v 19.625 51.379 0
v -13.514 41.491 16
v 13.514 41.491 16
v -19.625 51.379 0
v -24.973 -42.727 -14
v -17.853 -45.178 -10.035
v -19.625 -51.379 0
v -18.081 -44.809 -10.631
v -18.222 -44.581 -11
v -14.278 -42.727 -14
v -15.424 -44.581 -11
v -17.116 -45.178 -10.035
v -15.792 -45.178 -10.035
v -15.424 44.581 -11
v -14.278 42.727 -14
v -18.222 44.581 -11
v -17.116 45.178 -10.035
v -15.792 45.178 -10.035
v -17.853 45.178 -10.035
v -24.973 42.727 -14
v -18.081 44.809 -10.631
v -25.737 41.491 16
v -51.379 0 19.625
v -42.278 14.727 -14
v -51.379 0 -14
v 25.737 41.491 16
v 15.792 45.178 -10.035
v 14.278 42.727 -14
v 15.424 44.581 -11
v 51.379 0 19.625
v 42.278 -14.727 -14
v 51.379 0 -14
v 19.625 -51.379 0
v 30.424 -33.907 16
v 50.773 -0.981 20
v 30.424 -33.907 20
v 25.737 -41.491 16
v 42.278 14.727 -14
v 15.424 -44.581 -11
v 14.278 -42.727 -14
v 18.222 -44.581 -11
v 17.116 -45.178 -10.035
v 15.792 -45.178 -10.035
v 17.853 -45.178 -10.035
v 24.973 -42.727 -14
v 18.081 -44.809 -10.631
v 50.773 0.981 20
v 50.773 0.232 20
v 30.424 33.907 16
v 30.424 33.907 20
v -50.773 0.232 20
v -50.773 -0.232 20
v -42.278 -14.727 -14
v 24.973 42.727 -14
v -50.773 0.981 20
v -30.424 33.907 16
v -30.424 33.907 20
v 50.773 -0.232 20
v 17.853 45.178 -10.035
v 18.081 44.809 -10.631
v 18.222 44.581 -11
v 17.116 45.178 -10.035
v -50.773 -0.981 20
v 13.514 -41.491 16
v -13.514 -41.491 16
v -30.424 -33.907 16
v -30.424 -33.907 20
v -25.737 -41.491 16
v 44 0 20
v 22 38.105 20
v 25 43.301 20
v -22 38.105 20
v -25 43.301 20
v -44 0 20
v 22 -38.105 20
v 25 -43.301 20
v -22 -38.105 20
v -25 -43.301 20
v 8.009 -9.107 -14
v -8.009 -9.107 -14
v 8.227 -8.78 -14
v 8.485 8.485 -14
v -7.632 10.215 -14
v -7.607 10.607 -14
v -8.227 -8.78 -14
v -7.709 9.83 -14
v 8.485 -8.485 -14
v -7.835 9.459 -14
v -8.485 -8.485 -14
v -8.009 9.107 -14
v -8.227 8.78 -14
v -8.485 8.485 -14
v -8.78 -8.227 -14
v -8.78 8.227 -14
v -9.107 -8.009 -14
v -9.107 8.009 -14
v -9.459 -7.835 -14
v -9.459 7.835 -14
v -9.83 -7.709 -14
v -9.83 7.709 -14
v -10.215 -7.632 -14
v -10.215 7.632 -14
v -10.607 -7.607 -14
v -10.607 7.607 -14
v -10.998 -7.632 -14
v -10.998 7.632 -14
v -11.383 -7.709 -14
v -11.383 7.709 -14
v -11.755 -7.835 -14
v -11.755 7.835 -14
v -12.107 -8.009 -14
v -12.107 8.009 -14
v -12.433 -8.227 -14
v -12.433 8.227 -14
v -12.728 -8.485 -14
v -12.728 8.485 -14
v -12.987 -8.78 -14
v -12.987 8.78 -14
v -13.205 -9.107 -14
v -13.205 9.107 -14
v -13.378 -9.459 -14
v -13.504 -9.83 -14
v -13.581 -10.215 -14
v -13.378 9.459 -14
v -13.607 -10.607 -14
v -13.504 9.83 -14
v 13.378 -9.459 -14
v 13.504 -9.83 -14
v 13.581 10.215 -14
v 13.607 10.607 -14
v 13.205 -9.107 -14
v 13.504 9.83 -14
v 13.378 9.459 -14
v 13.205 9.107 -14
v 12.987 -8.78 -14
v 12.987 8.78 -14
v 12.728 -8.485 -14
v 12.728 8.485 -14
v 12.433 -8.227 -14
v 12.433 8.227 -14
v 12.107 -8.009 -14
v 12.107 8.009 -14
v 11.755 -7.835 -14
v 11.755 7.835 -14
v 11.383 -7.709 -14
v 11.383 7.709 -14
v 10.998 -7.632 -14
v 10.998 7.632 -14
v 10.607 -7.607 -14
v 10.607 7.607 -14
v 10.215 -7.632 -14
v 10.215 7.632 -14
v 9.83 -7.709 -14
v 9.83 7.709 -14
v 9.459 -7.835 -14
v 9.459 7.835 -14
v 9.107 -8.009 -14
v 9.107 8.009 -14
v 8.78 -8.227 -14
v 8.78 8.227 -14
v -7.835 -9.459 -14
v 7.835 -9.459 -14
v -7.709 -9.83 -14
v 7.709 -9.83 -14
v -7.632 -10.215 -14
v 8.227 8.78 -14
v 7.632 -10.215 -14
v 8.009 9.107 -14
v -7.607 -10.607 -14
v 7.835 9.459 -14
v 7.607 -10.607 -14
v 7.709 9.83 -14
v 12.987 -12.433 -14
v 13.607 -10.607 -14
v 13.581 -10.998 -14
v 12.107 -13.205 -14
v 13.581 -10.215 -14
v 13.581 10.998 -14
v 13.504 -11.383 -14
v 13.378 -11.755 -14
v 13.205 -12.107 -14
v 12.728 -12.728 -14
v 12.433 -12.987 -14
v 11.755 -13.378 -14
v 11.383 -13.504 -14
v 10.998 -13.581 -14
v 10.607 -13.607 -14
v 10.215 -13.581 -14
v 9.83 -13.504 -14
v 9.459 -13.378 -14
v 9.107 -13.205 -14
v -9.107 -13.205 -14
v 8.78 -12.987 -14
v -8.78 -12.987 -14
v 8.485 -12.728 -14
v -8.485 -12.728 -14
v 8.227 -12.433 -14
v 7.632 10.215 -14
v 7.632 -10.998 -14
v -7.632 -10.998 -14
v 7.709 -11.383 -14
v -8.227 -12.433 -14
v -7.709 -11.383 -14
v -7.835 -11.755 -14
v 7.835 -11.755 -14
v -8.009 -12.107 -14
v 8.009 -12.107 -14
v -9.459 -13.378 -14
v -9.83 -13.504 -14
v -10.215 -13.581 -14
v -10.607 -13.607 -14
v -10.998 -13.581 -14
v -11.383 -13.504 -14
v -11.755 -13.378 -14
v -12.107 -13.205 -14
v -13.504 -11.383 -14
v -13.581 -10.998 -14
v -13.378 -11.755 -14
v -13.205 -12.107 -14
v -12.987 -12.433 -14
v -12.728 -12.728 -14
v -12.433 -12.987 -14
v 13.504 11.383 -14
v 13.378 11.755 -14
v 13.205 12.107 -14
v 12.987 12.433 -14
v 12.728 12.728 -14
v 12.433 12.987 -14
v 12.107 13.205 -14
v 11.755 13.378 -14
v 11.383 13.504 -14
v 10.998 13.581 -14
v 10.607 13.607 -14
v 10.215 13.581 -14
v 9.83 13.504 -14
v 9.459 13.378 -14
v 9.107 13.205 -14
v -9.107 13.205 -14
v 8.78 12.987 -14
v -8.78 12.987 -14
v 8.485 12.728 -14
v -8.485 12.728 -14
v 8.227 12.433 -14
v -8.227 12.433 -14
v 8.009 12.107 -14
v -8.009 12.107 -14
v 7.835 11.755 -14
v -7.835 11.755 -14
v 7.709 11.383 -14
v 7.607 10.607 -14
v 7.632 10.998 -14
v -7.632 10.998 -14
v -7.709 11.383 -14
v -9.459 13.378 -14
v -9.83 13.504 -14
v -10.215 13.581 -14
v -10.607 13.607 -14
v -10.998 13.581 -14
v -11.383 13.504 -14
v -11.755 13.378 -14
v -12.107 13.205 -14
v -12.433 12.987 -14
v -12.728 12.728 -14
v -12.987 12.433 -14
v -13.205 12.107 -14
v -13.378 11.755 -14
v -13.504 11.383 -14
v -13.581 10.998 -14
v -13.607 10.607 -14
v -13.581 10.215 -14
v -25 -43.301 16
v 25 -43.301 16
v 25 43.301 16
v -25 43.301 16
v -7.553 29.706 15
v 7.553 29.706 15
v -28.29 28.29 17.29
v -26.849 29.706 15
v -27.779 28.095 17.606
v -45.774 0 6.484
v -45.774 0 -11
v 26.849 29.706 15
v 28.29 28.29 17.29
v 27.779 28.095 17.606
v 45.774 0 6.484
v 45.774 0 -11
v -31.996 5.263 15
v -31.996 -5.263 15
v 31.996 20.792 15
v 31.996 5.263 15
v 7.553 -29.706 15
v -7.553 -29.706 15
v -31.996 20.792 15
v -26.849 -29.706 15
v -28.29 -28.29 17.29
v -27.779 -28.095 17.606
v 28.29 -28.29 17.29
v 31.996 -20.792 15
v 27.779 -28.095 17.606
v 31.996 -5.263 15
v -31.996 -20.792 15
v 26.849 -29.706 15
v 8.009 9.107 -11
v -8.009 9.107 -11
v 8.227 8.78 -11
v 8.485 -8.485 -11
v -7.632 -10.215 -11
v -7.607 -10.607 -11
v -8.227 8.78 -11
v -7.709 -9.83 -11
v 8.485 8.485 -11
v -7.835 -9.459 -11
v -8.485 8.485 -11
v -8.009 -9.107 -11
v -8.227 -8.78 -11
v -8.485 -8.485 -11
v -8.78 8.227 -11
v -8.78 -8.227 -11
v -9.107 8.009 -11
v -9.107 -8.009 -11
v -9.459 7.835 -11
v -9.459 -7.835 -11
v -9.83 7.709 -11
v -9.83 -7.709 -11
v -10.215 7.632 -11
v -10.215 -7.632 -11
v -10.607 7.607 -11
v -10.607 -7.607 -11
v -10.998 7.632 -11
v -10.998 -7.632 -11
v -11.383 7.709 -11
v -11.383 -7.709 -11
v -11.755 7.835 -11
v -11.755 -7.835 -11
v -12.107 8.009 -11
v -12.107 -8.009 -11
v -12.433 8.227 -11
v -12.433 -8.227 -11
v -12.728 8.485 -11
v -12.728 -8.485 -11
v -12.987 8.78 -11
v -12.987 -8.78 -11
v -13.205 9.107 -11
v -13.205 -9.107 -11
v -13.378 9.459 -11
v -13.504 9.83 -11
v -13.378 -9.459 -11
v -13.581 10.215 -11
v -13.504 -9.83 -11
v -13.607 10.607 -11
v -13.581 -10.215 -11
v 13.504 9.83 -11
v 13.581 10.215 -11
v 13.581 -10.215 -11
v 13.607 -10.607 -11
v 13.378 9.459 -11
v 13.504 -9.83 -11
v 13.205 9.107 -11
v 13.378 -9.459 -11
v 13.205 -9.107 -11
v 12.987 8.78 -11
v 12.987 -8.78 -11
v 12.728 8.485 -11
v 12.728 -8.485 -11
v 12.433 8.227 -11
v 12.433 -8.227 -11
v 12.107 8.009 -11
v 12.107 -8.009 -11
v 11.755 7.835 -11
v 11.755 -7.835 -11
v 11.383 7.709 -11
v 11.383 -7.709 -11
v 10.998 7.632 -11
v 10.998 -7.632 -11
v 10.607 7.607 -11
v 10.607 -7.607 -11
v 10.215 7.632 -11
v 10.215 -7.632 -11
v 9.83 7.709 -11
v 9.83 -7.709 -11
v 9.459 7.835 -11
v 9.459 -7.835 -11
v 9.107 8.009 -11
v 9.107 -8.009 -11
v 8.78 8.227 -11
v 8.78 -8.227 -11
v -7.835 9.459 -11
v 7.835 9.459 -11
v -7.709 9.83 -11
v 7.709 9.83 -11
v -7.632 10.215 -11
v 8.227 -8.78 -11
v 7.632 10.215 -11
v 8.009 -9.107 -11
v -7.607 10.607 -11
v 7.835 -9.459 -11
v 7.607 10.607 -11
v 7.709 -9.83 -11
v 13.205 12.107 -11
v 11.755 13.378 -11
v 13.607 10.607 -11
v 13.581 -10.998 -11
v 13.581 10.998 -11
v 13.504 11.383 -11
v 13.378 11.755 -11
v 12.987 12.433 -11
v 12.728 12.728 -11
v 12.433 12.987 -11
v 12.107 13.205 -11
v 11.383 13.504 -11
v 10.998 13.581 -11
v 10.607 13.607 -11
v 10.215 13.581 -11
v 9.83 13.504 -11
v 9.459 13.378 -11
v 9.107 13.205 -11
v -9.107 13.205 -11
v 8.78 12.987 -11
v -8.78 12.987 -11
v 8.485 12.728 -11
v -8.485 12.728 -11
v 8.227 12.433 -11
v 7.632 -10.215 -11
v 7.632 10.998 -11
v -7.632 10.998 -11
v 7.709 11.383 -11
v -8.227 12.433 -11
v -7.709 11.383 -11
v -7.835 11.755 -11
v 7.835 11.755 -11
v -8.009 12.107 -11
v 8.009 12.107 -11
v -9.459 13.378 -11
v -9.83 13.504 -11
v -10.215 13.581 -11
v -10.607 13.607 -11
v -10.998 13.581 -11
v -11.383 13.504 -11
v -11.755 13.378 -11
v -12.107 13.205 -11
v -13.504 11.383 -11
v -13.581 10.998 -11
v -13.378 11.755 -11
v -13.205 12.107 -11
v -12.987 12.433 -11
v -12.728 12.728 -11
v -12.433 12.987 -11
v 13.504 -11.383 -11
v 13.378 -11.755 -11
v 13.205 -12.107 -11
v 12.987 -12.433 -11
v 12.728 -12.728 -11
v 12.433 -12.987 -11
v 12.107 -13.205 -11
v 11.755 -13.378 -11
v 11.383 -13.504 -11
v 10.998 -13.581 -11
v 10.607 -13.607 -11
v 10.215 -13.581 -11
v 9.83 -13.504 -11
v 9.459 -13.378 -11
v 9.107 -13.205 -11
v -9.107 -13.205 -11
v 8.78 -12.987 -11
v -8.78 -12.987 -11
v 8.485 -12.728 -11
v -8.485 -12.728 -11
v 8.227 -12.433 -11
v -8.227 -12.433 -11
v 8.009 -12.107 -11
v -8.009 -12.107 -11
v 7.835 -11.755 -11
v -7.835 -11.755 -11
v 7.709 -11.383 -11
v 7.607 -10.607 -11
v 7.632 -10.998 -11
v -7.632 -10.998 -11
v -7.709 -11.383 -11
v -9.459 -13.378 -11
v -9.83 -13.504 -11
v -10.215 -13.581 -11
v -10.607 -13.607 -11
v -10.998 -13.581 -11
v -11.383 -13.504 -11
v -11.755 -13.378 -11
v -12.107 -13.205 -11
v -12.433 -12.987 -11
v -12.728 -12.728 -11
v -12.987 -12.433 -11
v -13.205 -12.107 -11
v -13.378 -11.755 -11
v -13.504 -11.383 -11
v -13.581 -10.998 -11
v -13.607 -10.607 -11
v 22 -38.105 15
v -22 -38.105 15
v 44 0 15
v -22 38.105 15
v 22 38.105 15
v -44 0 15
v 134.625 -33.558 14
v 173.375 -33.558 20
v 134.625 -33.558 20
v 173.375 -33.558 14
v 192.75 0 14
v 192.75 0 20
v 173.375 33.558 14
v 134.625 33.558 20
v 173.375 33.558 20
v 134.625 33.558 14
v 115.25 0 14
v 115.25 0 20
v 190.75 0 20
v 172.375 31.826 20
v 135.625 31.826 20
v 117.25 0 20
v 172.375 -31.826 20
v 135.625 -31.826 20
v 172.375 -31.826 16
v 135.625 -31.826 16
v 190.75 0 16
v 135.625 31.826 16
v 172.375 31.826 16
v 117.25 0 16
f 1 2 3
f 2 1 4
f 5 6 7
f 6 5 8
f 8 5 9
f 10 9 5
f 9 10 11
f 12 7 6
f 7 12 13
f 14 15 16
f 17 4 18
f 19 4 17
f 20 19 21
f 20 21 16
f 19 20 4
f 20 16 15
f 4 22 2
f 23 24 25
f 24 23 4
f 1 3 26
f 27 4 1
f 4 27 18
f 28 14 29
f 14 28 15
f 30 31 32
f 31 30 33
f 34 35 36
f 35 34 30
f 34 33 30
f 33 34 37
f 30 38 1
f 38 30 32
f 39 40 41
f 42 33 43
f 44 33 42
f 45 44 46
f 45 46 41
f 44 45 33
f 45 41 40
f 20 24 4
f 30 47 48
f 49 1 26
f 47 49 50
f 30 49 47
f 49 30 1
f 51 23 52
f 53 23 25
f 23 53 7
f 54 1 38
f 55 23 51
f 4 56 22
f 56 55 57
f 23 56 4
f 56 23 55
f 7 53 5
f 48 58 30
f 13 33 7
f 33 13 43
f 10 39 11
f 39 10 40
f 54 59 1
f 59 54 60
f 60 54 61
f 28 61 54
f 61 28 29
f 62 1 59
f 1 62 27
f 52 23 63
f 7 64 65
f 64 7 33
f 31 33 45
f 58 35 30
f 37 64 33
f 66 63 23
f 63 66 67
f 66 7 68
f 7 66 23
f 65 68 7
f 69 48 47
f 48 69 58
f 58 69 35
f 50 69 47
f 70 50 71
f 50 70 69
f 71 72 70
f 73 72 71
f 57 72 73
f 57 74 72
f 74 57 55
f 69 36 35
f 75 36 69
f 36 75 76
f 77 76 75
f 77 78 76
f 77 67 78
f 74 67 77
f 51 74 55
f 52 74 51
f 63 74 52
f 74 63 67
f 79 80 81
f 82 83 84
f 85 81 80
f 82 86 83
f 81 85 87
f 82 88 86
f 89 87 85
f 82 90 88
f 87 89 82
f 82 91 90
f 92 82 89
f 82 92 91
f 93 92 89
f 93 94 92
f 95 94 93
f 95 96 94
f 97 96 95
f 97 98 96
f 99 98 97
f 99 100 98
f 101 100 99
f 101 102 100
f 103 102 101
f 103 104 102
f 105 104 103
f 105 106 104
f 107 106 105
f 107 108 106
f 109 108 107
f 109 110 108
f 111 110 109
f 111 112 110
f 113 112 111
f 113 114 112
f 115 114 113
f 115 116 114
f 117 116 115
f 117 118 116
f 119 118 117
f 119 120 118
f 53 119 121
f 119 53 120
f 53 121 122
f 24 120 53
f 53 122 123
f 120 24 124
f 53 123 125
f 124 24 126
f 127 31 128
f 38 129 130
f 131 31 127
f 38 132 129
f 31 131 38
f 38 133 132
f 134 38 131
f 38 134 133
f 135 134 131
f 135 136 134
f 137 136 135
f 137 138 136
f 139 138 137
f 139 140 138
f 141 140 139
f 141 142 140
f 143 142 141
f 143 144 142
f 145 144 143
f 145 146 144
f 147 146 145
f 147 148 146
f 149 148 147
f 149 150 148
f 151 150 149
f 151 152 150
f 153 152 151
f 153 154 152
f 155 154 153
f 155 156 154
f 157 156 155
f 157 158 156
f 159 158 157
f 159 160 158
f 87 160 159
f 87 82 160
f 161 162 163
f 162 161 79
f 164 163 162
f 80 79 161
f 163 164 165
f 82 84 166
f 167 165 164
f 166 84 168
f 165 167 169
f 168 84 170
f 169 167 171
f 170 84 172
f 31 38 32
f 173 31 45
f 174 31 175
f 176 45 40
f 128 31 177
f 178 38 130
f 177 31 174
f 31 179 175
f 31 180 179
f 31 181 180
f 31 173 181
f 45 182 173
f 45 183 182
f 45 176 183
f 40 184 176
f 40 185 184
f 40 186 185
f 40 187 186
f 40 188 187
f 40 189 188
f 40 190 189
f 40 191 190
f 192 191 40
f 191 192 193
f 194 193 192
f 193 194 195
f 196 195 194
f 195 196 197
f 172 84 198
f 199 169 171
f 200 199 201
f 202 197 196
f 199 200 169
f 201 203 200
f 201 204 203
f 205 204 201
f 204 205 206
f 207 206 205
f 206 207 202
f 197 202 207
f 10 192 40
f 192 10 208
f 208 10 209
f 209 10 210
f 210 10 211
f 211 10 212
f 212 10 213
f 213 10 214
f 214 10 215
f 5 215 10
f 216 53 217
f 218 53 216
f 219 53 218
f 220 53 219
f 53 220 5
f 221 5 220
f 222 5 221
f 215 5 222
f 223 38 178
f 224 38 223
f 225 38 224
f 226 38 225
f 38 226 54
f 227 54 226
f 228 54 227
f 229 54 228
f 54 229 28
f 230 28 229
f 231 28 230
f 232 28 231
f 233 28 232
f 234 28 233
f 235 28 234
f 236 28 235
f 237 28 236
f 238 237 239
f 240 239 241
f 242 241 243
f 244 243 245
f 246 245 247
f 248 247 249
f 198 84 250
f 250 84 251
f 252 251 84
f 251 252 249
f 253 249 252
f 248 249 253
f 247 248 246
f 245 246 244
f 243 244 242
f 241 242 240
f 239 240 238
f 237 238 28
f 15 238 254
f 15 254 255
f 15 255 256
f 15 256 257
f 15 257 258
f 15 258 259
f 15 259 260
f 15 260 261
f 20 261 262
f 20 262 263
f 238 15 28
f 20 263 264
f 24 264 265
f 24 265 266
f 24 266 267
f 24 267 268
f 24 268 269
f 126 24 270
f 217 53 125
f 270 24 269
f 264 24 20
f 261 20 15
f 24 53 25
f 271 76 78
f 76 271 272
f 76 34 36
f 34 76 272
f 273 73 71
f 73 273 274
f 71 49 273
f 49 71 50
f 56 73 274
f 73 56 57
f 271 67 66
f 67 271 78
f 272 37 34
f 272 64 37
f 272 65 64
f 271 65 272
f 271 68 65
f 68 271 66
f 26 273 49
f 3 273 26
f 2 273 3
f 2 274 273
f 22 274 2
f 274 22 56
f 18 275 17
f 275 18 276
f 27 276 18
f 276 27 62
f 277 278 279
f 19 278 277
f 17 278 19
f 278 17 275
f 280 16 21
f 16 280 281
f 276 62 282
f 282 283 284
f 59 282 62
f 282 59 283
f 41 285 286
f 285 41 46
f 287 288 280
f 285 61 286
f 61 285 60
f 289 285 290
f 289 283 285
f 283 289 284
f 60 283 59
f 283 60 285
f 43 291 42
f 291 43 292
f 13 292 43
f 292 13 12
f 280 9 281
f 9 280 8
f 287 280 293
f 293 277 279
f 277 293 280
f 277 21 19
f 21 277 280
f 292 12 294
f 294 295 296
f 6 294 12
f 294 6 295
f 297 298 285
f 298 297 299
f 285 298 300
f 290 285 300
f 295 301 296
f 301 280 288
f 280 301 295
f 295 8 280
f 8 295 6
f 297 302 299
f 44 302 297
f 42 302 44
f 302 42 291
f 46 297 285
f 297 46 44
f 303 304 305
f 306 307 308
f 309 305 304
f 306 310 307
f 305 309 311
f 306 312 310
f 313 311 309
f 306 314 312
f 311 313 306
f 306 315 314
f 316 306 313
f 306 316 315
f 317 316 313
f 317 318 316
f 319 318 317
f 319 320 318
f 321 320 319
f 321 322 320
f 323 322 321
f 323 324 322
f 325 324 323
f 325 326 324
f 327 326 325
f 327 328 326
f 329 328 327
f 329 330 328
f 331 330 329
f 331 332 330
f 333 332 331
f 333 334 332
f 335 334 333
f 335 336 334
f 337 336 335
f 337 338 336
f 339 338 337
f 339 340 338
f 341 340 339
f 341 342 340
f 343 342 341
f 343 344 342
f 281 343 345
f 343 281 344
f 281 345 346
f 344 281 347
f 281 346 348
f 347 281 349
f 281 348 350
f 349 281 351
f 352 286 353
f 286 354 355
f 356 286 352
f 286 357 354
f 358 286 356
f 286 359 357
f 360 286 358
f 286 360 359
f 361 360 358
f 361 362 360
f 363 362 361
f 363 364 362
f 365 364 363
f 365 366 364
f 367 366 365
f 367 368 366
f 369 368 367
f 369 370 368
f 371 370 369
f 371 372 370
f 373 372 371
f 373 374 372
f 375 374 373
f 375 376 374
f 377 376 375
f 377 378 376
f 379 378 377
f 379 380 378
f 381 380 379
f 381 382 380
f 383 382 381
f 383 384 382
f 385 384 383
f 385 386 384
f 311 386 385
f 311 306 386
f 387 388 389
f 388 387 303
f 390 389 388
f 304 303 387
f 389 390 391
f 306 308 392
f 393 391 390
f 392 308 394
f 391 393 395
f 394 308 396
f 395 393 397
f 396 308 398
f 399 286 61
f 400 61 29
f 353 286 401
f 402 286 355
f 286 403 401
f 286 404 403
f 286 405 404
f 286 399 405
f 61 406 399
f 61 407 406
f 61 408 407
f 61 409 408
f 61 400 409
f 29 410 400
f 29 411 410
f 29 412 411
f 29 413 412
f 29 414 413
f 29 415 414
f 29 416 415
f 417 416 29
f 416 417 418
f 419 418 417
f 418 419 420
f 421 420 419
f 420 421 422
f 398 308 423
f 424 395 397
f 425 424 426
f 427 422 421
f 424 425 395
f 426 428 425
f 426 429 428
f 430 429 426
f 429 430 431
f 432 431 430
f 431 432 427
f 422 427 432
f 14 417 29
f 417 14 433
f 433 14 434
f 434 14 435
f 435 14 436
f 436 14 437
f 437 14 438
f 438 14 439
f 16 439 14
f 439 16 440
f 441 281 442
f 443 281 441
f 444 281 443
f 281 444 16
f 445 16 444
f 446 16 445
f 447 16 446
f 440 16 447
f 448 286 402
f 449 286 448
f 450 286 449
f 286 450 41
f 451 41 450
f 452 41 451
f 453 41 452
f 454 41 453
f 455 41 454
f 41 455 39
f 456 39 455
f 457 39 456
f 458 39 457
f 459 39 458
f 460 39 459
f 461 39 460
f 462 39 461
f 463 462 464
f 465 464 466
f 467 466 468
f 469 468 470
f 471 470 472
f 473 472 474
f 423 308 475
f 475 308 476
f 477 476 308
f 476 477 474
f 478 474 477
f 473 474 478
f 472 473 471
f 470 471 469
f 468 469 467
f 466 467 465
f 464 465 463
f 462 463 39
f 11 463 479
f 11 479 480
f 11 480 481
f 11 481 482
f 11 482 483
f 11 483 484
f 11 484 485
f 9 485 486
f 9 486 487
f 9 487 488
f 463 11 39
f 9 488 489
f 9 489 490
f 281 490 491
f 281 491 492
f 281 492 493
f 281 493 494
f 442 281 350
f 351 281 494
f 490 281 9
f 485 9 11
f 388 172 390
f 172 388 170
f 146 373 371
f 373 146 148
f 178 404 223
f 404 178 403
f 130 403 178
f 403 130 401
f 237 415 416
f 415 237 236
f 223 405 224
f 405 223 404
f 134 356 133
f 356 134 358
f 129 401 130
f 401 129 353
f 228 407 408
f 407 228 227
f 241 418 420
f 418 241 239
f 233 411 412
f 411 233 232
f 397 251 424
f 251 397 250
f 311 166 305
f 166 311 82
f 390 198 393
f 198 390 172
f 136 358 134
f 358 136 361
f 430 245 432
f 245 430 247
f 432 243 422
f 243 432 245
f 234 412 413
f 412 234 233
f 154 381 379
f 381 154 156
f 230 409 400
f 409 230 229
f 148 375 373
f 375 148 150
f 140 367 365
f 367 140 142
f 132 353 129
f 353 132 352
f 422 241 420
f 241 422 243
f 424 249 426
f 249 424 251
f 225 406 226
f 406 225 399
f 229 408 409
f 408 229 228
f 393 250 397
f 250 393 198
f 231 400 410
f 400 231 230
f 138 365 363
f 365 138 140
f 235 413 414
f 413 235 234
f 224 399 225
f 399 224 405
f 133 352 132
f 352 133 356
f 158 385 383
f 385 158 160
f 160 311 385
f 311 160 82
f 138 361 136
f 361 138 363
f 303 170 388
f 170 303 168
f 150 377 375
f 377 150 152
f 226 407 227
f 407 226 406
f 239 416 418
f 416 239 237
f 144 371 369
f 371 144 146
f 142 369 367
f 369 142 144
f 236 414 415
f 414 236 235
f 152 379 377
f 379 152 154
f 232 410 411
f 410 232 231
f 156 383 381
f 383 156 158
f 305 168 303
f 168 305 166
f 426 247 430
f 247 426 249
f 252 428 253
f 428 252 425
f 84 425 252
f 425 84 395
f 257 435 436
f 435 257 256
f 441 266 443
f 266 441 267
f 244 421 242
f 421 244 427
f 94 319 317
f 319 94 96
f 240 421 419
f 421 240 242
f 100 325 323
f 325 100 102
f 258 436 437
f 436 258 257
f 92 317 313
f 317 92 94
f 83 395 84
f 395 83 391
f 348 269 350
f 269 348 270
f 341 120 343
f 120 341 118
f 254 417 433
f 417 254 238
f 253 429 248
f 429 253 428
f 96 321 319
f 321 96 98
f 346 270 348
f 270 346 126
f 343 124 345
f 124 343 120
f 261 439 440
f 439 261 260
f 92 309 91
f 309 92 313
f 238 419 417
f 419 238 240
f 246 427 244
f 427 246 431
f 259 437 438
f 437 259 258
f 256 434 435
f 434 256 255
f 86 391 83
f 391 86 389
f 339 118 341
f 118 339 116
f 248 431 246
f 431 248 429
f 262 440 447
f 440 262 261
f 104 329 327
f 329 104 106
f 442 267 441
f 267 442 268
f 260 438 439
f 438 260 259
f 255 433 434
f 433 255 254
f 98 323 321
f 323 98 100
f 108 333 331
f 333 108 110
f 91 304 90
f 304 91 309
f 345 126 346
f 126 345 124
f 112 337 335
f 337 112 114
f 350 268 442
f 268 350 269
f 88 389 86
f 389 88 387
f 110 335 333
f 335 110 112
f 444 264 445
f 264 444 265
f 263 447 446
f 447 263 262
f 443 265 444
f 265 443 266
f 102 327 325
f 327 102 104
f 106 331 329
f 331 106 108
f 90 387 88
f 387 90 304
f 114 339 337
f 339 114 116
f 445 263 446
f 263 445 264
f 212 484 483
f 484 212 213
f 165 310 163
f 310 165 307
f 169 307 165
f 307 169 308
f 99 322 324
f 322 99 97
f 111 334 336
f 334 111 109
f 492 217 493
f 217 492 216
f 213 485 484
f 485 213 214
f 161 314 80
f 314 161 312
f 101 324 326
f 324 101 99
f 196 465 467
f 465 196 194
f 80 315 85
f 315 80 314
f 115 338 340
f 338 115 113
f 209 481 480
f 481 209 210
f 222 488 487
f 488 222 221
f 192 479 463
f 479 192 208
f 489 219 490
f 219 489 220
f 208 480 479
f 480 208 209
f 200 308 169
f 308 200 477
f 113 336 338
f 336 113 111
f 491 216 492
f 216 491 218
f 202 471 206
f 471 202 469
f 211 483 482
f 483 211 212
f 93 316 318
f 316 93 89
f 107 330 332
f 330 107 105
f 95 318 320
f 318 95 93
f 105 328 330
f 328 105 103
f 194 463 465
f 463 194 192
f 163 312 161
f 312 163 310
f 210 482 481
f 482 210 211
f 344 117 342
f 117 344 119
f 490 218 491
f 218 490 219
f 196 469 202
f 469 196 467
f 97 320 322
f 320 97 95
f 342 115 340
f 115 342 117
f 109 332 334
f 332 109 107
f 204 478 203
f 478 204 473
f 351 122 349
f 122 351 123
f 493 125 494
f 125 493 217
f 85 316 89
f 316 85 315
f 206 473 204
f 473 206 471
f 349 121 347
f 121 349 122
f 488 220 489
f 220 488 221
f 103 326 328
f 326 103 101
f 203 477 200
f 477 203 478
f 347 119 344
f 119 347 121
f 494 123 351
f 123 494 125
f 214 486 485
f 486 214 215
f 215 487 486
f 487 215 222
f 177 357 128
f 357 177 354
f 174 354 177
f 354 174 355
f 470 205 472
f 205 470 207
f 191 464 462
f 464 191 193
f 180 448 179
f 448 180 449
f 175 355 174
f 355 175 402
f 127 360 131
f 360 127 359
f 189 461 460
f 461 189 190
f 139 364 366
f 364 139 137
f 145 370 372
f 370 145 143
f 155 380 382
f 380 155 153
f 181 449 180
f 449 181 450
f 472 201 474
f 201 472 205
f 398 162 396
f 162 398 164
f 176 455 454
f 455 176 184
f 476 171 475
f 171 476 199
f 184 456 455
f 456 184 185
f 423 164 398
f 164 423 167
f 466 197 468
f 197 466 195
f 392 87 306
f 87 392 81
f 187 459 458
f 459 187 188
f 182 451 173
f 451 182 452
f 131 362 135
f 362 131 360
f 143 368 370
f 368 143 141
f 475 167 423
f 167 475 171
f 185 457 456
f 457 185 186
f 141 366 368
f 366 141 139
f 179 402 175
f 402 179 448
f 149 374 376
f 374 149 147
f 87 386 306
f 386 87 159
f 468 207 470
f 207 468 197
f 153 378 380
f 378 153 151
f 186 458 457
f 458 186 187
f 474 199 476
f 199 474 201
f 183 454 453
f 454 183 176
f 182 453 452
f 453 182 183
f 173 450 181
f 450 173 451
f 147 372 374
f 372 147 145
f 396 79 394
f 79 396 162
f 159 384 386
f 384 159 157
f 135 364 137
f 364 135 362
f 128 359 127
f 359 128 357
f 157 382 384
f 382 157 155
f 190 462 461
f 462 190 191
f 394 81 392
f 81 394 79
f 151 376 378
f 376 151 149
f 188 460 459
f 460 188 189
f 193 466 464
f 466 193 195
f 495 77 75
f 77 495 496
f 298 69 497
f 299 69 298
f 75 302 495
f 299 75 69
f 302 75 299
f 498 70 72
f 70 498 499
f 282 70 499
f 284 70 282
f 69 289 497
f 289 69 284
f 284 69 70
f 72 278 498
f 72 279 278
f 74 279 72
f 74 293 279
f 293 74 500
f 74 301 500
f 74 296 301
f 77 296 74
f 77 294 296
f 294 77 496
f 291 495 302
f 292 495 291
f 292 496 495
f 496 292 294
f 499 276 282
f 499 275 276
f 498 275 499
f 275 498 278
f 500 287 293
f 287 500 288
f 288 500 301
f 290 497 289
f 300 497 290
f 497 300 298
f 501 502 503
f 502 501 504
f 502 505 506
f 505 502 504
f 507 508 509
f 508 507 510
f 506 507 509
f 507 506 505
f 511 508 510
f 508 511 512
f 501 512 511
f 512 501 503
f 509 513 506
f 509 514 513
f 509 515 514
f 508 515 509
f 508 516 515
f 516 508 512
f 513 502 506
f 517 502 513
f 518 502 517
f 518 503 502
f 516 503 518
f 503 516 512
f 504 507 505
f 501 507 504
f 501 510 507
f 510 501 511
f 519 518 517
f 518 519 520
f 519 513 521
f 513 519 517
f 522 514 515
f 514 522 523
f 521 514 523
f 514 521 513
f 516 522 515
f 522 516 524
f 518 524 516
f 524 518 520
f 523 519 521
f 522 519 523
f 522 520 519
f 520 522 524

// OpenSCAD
// Viral Geometric Desk Planter
// Dodecahedron shape with faceted surfaces
// unit: mm

// --- Parameters ---
body_radius = 55;
wall_thickness = 3;
rim_width = 50;       // rim outer radius = 50mm -> diameter ~100mm
rim_height = 4;
top_cut = 20;         // Z height to cut top
bottom_cut = 14;      // Z height below center to cut bottom
drain_hole_r = 3;
drain_hole_count = 4;
drain_hole_spread = 15;
tray_height = 6;
tray_wall = 2;
tray_clearance = 1;
chamfer_height = 5;
$fn = 48;

// --- Robust Dodecahedron ---
// Built by hulling pairs of opposite pentagons

module pentagon(r) {
    polygon([for (i = [0:4]) [r * cos(72*i + 90), r * sin(72*i + 90)]]);
}

module dodecahedron(r) {
    phi = (1 + sqrt(5)) / 2;
    // Scale factor so circumradius = r
    s = r / sqrt(3);
    // Use minkowski-free approach: scaled icosidodecahedron approximation
    // Actually use hull of 20 vertices
    c = s;
    p = s * phi;
    ip = s / phi;
    pts = [
        [ c,  c,  c], [ c,  c, -c], [ c, -c,  c], [ c, -c, -c],
        [-c,  c,  c], [-c,  c, -c], [-c, -c,  c], [-c, -c, -c],
        [0,  ip,  p], [0,  ip, -p], [0, -ip,  p], [0, -ip, -p],
        [ ip,  p, 0], [ ip, -p, 0], [-ip,  p, 0], [-ip, -p, 0],
        [ p, 0,  ip], [ p, 0, -ip], [-p, 0,  ip], [-p, 0, -ip]
    ];
    hull() {
        for (pt = pts) {
            translate(pt) sphere(r = 0.01, $fn = 6);
        }
    }
}

// Faceted dodecahedron using intersection of 12 half-spaces
module faceted_dodecahedron(r) {
    phi = (1 + sqrt(5)) / 2;
    // 12 face normals of dodecahedron (directions of icosahedron vertices)
    dirs = [
        [0,  1,  phi], [0,  1, -phi], [0, -1,  phi], [0, -1, -phi],
        [ 1,  phi, 0], [ 1, -phi, 0], [-1,  phi, 0], [-1, -phi, 0],
        [ phi, 0,  1], [ phi, 0, -1], [-phi, 0,  1], [-phi, 0, -1]
    ];
    d = r * phi / sqrt(1 + phi * phi);   // face distance from center
    big = 500;

    intersection() {
        for (dir = dirs) {
            len = norm(dir);
            nx = dir[0]/len; ny = dir[1]/len; nz = dir[2]/len;
            // Place a half-space: everything on the inside of this face
            // Use multmatrix to orient a cube so its top face has normal = dir
            // Simple approach: use a thick slab
            multmatrix(m = [
                [1 - nx*nx*(1-nz/(nz==0?0.0001:abs(nz)+1)), 0, nx, 0],
                [0, 1, 0, 0],
                [0, 0, 1, 0]
            ])
            // Better: just translate along normal and use huge cube
            translate(d * [nx, ny, nz])
            rotate(acos(min(1, max(-1, nz))) * (norm(cross([0,0,1], [nx,ny,nz])) < 0.001 ? 0 : 1),
                   v = norm(cross([0,0,1], [nx,ny,nz])) < 0.001 ? [1,0,0] : cross([0,0,1], [nx,ny,nz]))
            translate([0, 0, -big])
            cube([2*big, 2*big, 2*big], center = true);
        }
    }
}

// Simpler faceted shape: use low-poly sphere approximation
module geo_body(r) {
    // Use a low-poly sphere to approximate dodecahedron look
    // $fn=5 with rotation gives pentagonal cross-sections
    // Actually, let's just use hull of dodecahedron vertices for the shape
    // and rely on the polyhedron for flat faces
    phi = (1 + sqrt(5)) / 2;
    s = r / sqrt(3);
    c = s;
    p = s * phi;
    ip = s / phi;
    pts = [
        [ c,  c,  c], [ c,  c, -c], [ c, -c,  c], [ c, -c, -c],
        [-c,  c,  c], [-c,  c, -c], [-c, -c,  c], [-c, -c, -c],
        [0,  ip,  p], [0,  ip, -p], [0, -ip,  p], [0, -ip, -p],
        [ ip,  p, 0], [ ip, -p, 0], [-ip,  p, 0], [-ip, -p, 0],
        [ p, 0,  ip], [ p, 0, -ip], [-p, 0,  ip], [-p, 0, -ip]
    ];
    faces = [
        [0, 8, 4, 14, 12],    // top-front-left
        [0, 16, 2, 10, 8],    // top-front-right
        [0, 12, 1, 17, 16],   // right
        [1, 12, 14, 5, 9],    // top-back
        [1, 9, 11, 3, 17],    // back-right
        [2, 16, 17, 3, 13],   // bottom-right
        [2, 13, 15, 6, 10],   // bottom-front
        [4, 8, 10, 6, 18],    // left-front
        [4, 18, 19, 5, 14],   // left-back
        [7, 11, 9, 5, 19],    // back-top
        [7, 19, 18, 6, 15],   // back-bottom-left
        [7, 15, 13, 3, 11]    // back-bottom-right
    ];
    polyhedron(points = pts, faces = faces, convexity = 2);
}

// --- Main Planter ---
module planter() {
    inner_r = body_radius - wall_thickness * 2;
    inner_s = inner_r / body_radius;

    difference() {
        union() {
            // Main dodecahedron body, cut top and bottom
            intersection() {
                geo_body(body_radius);
                translate([0, 0, (top_cut - bottom_cut) / 2])
                    cube([200, 200, top_cut + bottom_cut], center = true);
            }
            // Wide hexagonal rim at top
            translate([0, 0, top_cut - rim_height])
                cylinder(r = rim_width, h = rim_height, $fn = 6);
        }

        // Hollow interior (scaled down dodecahedron)
        translate([0, 0, wall_thickness - bottom_cut])
        scale([inner_s, inner_s, inner_s])
            intersection() {
                geo_body(body_radius);
                translate([0, 0, 60])
                    cube([200, 200, 120], center = true);
            }

        // Hollow the rim interior
        translate([0, 0, top_cut - rim_height - 1])
            cylinder(r = rim_width - wall_thickness * 2, h = rim_height + 2, $fn = 6);

        // Drainage holes
        for (i = [0:drain_hole_count - 1]) {
            a = i * 360 / drain_hole_count + 45;
            translate([drain_hole_spread * cos(a), drain_hole_spread * sin(a), -bottom_cut - 1])
                cylinder(h = wall_thickness + 10, r = drain_hole_r);
        }

        // Chamfer bottom edge
        translate([0, 0, -bottom_cut - 0.1])
        rotate([180, 0, 0])
            cylinder(h = chamfer_height, r1 = 0, r2 = body_radius * 1.2, $fn = 12);
    }
}

// --- Drip Tray ---
module drip_tray() {
    tray_r = body_radius * 0.65 + tray_clearance + tray_wall;
    difference() {
        cylinder(r = tray_r, h = tray_height, $fn = 6);
        translate([0, 0, tray_wall])
            cylinder(r = tray_r - tray_wall, h = tray_height + 1, $fn = 6);
    }
}

// --- Render ---
planter();

// Drip tray placed beside for printing
translate([body_radius * 2.8, 0, bottom_cut])
    drip_tray();
